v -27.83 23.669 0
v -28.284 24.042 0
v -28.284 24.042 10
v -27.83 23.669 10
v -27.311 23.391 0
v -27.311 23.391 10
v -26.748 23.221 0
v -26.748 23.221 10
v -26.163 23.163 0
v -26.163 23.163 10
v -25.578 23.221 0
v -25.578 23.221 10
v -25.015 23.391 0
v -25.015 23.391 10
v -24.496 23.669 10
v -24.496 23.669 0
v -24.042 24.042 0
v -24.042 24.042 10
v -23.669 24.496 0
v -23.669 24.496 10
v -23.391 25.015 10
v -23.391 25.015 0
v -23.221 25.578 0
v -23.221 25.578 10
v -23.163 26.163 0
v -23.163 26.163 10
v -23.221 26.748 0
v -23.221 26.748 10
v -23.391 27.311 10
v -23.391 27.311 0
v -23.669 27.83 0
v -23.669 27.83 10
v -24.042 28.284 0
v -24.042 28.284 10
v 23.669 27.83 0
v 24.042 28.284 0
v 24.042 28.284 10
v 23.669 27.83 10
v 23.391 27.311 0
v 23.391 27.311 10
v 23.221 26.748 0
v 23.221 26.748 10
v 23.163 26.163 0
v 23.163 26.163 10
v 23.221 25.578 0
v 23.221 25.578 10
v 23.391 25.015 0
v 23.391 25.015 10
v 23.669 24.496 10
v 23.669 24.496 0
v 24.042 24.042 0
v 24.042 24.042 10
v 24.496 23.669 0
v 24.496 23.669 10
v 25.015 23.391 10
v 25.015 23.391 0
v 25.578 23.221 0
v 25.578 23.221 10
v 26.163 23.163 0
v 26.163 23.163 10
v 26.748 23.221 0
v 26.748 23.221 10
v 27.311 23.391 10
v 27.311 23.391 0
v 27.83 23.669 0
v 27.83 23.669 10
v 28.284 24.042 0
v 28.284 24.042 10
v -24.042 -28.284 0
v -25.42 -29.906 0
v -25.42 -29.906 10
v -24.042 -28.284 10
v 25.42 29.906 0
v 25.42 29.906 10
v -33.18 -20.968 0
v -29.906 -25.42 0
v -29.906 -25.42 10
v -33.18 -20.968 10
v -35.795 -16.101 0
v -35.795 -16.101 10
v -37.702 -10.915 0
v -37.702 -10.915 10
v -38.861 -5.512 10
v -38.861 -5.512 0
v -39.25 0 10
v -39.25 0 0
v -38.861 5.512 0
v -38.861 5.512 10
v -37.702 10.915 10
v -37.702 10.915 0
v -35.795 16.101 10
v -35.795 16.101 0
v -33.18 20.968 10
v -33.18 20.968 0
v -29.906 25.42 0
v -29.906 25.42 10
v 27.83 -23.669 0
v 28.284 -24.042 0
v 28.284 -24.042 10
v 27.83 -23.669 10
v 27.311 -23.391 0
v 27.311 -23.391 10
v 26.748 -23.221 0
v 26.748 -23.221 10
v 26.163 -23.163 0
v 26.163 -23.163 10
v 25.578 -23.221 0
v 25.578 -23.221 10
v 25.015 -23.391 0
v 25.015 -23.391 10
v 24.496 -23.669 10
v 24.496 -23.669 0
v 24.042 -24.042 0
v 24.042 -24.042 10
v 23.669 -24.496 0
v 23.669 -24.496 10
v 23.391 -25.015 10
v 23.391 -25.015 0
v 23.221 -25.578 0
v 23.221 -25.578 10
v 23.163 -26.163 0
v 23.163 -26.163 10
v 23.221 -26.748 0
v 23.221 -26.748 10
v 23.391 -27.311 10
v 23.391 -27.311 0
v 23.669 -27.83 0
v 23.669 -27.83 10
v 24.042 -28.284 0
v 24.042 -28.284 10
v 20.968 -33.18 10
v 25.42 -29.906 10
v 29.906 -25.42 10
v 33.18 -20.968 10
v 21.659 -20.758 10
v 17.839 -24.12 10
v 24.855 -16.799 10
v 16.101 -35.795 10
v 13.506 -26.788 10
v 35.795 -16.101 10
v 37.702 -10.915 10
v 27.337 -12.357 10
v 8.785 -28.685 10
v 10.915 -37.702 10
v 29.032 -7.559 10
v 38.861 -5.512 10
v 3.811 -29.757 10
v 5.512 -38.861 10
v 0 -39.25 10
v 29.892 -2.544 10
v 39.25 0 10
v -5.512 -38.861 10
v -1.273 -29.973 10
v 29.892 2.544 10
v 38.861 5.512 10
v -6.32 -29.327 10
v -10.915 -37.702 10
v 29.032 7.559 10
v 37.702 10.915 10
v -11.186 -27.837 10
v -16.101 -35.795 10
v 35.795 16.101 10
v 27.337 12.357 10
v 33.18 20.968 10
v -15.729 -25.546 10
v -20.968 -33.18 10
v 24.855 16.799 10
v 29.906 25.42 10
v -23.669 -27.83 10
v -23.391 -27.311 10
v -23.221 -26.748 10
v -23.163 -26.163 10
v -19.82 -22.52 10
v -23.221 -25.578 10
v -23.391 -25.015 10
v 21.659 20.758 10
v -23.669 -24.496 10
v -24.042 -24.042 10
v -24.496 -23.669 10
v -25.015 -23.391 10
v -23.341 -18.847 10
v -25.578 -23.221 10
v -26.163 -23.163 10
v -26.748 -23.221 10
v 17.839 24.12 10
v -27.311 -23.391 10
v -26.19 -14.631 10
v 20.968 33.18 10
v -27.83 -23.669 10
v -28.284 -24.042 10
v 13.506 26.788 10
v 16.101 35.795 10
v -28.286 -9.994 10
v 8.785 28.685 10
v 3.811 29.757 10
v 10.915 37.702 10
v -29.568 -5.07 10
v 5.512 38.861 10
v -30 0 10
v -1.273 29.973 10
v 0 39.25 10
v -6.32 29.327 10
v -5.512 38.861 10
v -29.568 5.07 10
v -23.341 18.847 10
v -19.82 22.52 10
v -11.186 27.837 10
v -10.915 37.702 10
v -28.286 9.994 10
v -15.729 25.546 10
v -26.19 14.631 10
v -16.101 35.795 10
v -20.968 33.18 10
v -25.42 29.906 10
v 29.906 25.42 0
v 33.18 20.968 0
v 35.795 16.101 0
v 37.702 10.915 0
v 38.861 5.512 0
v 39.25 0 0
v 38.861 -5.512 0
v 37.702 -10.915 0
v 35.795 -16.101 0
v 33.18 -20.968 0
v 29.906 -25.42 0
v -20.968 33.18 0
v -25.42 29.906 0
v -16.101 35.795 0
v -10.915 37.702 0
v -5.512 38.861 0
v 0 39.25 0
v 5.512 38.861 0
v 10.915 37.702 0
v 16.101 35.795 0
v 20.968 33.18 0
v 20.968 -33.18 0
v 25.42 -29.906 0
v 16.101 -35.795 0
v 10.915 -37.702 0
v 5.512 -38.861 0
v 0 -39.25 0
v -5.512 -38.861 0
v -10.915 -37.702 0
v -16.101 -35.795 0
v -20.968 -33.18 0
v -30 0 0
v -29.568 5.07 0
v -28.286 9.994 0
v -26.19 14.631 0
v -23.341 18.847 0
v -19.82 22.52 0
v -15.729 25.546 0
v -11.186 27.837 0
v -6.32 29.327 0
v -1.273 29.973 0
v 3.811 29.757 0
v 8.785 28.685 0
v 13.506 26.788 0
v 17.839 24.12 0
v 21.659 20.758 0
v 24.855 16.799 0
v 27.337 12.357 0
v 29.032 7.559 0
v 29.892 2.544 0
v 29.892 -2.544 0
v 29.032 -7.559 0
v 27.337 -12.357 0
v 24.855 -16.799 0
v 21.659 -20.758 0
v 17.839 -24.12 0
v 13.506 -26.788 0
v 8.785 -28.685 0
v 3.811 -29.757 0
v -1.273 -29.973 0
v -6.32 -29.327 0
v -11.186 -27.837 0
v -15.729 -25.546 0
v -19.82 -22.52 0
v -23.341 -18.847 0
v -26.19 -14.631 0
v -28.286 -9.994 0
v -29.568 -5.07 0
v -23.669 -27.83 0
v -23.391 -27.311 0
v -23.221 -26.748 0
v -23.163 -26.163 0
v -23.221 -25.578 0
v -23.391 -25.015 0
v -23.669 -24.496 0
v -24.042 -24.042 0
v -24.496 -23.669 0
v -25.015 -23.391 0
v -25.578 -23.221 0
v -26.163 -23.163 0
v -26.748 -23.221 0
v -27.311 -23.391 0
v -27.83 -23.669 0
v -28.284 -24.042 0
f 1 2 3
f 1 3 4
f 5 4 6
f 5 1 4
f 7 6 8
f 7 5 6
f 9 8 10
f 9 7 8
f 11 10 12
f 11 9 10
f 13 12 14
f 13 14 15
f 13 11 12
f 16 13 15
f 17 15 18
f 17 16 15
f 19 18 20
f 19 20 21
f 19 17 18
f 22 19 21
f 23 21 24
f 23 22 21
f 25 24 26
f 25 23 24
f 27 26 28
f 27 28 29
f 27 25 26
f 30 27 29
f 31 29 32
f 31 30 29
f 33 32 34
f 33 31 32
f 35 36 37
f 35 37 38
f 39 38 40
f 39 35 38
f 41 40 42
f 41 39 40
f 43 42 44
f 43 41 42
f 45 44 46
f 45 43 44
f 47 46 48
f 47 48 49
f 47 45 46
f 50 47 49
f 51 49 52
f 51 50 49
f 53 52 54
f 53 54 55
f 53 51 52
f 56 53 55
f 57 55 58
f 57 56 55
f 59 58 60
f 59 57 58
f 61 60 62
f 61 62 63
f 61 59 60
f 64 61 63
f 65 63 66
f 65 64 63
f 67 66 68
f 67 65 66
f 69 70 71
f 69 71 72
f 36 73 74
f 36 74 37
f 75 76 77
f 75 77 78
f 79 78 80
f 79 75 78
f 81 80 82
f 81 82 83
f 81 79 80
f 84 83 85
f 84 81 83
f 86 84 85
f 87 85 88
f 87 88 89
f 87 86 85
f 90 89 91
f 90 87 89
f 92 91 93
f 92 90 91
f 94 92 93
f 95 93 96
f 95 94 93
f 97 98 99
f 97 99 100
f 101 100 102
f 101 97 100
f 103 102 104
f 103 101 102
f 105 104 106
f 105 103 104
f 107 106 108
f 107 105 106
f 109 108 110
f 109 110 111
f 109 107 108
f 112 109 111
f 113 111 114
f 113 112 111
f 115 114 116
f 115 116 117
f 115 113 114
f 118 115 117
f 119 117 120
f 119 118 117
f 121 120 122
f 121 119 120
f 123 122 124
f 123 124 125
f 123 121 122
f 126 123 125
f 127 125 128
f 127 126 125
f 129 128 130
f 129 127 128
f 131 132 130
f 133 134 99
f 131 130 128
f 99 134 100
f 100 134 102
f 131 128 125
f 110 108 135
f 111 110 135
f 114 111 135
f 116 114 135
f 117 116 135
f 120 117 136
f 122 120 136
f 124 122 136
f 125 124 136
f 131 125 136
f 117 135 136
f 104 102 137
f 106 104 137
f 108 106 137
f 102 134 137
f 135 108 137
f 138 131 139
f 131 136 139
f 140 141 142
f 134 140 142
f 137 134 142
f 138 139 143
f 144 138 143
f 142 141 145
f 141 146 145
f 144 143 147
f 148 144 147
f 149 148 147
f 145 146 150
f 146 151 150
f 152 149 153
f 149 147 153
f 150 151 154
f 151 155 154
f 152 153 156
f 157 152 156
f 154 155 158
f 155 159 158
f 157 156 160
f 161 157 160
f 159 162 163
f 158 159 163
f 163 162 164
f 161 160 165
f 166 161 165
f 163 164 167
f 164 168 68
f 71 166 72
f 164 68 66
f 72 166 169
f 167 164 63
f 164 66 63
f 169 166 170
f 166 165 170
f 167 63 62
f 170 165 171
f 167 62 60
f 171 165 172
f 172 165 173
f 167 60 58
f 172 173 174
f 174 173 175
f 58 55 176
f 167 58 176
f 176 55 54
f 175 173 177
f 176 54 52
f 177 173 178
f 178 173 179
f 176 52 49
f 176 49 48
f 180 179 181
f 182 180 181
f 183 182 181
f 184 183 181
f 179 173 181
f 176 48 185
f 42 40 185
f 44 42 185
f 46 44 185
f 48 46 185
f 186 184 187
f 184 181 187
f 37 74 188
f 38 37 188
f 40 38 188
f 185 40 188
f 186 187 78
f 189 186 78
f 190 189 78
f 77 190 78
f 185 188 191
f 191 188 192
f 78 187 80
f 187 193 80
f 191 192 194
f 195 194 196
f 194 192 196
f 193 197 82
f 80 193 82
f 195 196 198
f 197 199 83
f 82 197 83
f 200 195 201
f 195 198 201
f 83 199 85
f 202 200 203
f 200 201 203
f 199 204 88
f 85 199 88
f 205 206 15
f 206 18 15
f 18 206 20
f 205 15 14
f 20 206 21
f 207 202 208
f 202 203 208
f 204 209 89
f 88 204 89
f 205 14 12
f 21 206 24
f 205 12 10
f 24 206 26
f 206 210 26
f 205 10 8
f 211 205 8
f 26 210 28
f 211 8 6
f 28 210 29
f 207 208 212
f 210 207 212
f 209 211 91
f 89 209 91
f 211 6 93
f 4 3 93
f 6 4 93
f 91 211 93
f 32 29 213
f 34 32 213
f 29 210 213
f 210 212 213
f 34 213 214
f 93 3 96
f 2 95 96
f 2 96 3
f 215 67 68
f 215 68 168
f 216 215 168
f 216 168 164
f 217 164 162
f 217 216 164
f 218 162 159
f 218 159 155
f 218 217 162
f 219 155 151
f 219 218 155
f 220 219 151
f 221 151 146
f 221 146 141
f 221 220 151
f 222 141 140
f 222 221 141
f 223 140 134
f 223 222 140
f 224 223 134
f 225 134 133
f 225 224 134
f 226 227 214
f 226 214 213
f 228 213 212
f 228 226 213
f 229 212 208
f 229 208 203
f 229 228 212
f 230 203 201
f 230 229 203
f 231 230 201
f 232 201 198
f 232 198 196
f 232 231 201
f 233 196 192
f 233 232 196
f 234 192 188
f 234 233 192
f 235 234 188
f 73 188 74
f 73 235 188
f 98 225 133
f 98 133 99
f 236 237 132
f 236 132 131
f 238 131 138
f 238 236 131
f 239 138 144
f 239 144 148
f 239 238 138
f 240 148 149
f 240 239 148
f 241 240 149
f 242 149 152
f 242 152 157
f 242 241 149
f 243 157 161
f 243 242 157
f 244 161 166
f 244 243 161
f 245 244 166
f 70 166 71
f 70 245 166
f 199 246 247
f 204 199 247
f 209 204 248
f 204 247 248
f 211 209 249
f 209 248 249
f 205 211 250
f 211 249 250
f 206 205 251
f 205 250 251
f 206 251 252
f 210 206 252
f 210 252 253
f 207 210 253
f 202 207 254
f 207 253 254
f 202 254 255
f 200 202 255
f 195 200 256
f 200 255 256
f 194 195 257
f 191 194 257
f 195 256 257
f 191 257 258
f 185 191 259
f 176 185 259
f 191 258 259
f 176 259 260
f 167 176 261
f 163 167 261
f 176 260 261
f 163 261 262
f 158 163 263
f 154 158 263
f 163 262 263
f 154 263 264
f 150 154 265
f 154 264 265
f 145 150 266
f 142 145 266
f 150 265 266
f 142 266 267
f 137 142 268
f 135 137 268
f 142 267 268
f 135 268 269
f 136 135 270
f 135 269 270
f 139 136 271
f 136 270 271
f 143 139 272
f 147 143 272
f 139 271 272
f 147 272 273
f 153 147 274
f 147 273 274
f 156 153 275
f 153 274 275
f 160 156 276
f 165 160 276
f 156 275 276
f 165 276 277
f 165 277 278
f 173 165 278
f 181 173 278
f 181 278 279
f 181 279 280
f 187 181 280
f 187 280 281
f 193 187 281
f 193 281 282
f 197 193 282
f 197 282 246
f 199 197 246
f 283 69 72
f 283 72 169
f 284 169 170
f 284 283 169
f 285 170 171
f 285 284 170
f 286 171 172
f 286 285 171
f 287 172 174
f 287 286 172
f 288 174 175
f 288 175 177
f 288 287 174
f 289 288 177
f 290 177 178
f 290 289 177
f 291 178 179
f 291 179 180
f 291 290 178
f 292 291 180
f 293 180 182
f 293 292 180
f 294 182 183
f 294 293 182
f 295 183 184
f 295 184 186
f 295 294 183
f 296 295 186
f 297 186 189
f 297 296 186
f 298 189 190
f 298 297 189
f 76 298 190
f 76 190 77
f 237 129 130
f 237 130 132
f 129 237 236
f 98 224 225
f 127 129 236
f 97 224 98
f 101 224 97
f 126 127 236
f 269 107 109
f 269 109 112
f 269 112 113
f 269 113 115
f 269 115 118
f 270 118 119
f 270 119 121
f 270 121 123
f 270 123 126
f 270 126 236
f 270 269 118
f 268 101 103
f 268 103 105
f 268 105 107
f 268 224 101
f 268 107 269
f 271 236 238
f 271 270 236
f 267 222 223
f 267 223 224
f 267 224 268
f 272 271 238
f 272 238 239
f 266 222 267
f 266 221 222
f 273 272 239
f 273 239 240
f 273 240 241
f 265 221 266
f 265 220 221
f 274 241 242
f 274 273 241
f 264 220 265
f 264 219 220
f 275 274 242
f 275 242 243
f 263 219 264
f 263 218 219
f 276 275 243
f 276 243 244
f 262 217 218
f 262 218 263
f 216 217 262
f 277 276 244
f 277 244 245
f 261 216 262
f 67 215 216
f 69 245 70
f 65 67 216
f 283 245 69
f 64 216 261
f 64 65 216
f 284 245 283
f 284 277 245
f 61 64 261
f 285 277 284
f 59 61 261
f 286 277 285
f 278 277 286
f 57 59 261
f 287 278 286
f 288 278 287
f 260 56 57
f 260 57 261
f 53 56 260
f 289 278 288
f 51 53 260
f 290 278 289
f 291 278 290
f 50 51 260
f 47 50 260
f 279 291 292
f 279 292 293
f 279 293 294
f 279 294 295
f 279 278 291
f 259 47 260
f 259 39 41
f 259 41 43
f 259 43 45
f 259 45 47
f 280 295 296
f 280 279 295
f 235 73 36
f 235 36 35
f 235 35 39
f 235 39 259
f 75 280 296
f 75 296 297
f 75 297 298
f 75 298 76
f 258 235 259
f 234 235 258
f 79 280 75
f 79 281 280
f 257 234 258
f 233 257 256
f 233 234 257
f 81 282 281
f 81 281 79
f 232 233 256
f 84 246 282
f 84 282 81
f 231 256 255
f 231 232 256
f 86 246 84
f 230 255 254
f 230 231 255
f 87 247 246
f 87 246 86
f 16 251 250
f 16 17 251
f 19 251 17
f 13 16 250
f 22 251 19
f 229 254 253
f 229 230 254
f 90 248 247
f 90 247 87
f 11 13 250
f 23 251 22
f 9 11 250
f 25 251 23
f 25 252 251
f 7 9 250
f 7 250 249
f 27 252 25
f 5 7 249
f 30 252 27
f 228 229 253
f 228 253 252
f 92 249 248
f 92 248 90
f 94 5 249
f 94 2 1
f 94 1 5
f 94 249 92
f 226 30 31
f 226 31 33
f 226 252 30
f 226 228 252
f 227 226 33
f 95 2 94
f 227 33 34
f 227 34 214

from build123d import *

# Parameters (mm, degrees)
EXTRUDE_1_DEPTH     = 10
SKETCH_2_R          = 30
CUT_EXTRUDE_1_DEPTH = 10


with BuildPart() as part:
    # 草图1 → 凸台-拉伸1 (new body)
    with BuildSketch(Plane.XY):
        with BuildLine():
            Line((-24.04163056, 28.284271247), (-25.420200489, 29.906118222))
            ThreePointArc((-25.420200489, 29.906118222), (0, 39.25), (25.420200489, 29.906118222))
            Line((25.420200489, 29.906118222), (24.04163056, 28.284271247))
            ThreePointArc((24.04163056, 28.284271247), (24.04163056, 24.04163056), (28.284271247, 24.04163056))
            Line((28.284271247, 24.04163056), (29.906118222, 25.420200489))
            ThreePointArc((29.906118222, 25.420200489), (39.25, 0), (29.906118222, -25.420200489))
            Line((29.906118222, -25.420200489), (28.284271247, -24.04163056))
            ThreePointArc((28.284271247, -24.04163056), (24.04163056, -24.04163056), (24.04163056, -28.284271247))
            Line((24.04163056, -28.284271247), (25.420200489, -29.906118222))
            ThreePointArc((25.420200489, -29.906118222), (0, -39.25), (-25.420200489, -29.906118222))
            Line((-25.420200489, -29.906118222), (-24.04163056, -28.284271247))
            ThreePointArc((-24.04163056, -28.284271247), (-24.04163056, -24.04163056), (-28.284271247, -24.04163056))
            Line((-28.284271247, -24.04163056), (-29.906118222, -25.420200489))
            ThreePointArc((-29.906118222, -25.420200489), (-39.25, 0), (-29.906118222, 25.420200489))
            Line((-29.906118222, 25.420200489), (-28.284271247, 24.04163056))
            ThreePointArc((-28.284271247, 24.04163056), (-24.04163056, 24.04163056), (-24.04163056, 28.284271247))
        make_face()
    extrude(amount=EXTRUDE_1_DEPTH)

    # 草图2 → 切除-拉伸1 (cut)
    with BuildSketch(Plane(origin=(0, 0, 0), x_dir=(-1, 0, 0), z_dir=(0, 0, -1))):
        Circle(SKETCH_2_R)
    extrude(amount=-CUT_EXTRUDE_1_DEPTH, mode=Mode.SUBTRACT)


solid = part.part
